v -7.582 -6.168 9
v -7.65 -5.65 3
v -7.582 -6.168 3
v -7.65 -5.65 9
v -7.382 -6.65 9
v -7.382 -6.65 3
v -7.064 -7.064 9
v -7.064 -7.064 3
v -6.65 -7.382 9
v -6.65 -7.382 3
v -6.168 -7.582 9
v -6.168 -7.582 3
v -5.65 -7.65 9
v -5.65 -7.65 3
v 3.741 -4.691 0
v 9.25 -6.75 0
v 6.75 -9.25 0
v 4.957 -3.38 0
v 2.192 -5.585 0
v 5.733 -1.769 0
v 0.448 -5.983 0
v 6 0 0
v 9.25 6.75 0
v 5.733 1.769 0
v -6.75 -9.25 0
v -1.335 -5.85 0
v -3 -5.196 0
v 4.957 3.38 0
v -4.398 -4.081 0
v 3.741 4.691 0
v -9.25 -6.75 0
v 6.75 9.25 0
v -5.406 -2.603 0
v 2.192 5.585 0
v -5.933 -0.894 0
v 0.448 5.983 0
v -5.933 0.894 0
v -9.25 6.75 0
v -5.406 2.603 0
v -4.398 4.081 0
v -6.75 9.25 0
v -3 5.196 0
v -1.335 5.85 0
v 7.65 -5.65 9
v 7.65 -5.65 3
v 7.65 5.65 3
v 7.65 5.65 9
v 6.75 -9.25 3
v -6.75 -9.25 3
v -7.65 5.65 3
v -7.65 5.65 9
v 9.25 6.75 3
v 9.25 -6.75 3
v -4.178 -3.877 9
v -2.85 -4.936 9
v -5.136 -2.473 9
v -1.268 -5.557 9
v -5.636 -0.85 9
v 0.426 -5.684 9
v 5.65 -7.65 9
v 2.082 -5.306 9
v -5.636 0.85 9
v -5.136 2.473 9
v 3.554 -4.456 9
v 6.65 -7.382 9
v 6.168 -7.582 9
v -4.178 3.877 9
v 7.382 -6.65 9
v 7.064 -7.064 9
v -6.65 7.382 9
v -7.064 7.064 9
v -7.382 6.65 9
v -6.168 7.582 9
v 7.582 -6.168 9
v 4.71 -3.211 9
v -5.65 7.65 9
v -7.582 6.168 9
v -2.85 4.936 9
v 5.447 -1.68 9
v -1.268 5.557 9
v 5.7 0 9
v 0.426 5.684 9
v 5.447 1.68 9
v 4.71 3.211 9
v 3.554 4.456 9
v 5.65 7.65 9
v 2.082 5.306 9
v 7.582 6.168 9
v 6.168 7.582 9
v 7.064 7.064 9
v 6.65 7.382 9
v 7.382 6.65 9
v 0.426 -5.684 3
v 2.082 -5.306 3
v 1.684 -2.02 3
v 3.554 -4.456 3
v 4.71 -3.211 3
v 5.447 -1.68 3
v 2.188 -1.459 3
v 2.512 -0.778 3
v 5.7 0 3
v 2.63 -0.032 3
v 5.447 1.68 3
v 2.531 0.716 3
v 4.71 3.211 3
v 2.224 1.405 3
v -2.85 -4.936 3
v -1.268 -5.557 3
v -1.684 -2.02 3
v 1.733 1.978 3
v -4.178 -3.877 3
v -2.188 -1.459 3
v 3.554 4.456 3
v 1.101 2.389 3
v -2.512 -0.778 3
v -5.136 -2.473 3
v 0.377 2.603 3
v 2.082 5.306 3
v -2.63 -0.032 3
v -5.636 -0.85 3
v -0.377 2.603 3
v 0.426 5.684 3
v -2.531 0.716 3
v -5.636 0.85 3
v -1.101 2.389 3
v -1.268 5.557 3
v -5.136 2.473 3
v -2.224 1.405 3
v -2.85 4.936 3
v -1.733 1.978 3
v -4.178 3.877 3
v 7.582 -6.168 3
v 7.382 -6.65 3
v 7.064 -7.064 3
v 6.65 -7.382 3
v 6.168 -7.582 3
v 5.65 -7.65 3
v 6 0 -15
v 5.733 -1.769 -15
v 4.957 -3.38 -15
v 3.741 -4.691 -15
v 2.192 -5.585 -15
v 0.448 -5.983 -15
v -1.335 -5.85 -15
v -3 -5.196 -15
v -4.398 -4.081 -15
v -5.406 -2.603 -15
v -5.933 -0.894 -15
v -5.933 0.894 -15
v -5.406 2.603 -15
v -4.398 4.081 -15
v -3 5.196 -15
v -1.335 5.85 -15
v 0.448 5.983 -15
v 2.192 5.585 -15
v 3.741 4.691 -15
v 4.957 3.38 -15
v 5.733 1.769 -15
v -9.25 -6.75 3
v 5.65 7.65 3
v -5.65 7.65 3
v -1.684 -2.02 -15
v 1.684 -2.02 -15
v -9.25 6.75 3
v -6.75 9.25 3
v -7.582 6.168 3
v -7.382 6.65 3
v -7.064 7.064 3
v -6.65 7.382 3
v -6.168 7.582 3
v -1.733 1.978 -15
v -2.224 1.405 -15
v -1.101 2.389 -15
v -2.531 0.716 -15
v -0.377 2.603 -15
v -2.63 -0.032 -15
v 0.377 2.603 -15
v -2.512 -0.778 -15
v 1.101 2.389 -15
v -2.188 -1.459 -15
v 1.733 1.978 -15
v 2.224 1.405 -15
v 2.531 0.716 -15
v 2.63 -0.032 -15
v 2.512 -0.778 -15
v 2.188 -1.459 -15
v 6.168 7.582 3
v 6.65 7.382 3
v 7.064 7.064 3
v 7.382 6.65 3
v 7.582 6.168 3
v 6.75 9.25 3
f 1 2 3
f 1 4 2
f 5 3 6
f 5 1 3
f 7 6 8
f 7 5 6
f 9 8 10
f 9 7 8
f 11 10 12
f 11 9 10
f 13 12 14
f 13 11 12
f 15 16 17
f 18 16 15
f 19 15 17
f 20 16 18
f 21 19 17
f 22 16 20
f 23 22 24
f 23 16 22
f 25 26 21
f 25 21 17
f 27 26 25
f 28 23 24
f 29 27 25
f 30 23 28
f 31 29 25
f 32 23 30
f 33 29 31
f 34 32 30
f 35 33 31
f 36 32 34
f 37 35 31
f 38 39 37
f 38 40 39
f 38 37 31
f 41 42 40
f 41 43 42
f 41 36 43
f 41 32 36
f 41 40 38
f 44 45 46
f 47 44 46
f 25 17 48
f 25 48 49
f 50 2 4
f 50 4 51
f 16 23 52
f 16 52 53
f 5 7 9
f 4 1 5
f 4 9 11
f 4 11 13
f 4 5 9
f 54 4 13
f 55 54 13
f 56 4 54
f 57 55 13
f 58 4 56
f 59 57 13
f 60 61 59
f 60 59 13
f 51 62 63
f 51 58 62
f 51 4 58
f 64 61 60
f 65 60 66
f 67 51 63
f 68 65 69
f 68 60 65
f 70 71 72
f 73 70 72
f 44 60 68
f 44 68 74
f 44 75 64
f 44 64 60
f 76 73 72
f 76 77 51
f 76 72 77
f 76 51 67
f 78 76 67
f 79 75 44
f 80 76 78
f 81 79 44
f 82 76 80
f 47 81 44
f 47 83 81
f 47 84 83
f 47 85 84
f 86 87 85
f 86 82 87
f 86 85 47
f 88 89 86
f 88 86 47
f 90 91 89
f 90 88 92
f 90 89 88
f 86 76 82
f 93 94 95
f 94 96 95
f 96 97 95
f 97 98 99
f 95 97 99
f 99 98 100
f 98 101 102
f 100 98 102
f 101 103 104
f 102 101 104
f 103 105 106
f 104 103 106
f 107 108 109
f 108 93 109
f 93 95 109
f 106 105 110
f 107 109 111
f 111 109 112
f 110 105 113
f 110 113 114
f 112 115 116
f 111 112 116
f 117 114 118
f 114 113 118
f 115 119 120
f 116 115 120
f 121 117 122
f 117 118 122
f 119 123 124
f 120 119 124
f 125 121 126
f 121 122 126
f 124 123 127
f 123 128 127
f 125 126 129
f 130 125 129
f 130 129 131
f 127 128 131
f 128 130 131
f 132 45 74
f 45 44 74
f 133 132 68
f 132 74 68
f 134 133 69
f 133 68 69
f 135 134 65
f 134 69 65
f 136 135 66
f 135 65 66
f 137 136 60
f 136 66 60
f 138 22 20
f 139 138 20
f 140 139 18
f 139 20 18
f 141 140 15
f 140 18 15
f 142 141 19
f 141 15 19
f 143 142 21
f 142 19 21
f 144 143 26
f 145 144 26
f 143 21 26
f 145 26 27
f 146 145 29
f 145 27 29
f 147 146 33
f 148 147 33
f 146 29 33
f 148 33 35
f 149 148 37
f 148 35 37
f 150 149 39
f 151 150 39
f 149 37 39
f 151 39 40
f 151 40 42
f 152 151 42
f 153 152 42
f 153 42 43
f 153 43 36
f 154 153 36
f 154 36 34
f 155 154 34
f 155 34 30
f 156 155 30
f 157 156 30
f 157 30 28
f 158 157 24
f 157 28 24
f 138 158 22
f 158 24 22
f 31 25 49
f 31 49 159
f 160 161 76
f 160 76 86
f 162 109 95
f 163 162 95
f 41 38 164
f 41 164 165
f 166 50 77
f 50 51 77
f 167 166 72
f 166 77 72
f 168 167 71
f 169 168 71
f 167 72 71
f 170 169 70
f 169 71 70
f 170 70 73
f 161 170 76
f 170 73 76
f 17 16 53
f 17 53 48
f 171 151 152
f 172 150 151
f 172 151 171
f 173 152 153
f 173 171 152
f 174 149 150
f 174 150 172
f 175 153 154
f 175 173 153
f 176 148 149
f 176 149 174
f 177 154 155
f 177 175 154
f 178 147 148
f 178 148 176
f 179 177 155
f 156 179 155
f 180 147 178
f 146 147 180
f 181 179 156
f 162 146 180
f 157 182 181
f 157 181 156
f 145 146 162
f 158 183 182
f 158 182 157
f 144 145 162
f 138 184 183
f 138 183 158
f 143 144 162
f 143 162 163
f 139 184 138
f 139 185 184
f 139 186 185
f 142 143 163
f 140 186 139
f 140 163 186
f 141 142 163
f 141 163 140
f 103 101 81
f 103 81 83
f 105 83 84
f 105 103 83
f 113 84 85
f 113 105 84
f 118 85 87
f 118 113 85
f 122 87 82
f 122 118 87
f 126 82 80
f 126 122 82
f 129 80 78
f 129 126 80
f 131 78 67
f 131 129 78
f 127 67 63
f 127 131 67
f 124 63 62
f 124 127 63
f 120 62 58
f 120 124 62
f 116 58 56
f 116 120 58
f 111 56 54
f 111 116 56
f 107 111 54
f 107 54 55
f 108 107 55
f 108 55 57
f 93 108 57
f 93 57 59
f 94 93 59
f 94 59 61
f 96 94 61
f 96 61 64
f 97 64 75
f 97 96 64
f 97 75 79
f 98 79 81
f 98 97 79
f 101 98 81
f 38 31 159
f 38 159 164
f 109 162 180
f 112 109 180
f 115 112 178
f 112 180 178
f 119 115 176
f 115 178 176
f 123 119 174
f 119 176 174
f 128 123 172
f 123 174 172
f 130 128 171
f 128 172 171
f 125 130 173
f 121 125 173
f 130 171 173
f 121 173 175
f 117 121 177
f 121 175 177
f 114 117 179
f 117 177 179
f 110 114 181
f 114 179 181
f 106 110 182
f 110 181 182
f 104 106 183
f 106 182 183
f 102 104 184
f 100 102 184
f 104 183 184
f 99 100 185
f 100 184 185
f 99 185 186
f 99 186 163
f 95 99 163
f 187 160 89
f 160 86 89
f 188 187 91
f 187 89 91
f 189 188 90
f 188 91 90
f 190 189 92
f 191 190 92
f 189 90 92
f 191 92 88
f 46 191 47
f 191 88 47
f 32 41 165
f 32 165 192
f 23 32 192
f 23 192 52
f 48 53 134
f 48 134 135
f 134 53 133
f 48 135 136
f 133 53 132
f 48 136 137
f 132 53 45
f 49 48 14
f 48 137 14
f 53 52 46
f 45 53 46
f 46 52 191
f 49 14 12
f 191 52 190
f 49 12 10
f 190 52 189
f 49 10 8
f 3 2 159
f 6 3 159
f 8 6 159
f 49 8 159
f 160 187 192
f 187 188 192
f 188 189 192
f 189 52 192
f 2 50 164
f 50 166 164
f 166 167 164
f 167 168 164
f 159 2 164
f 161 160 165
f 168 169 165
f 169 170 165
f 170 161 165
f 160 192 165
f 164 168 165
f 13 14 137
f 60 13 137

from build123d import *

# Parameters (mm, degrees)
PAD_DEPTH    = 3
SKETCH001_W  = 15.3
SKETCH001_H  = 15.3
SKETCH001_R  = 5.7
PAD001_DEPTH = 6
SKETCH002_R  = 6
PAD002_DEPTH = 15
POCKET_DEPTH = 24.001
FILLET_R     = 2


with BuildPart() as part:
    # Sketch → Pad (new body)
    with BuildSketch(Plane.XY):
        Polygon((-9.25, 6.75), (-6.75, 9.25), (6.75, 9.25), (9.25, 6.75), (9.25, -6.75), (6.75, -9.25), (-6.75, -9.25), (-9.25, -6.75), align=None)
    extrude(amount=PAD_DEPTH)

    # Sketch001 → Pad001 (new body)
    with BuildSketch(Plane.XY.offset(3)):
        Rectangle(SKETCH001_W, SKETCH001_H)
        Circle(SKETCH001_R, mode=Mode.SUBTRACT)
    extrude(amount=PAD001_DEPTH)

    # Sketch002 → Pad002 (new body)
    with BuildSketch(Plane(origin=(0, 0, 0), x_dir=(1, 0, 0), z_dir=(0, 0, -1))):
        Circle(SKETCH002_R)
    extrude(amount=PAD002_DEPTH)

    # Sketch003 → Pocket (cut, through all)
    with BuildSketch(Plane(origin=(0, 0, -15), x_dir=(1, 0, 0), z_dir=(0, 0, -1))):
        with BuildLine():
            Line((-1.684191, 2.02), (1.684191, 2.02))
            ThreePointArc((-1.684191, 2.02), (0, -2.63), (1.684191, 2.02))
        make_face()
    extrude(amount=-POCKET_DEPTH, mode=Mode.SUBTRACT)

    # Fillet
    fillet_edges = [part.edges().sort_by_distance(p)[0] for p in [
        (-7.65, -7.65, 6),
        (7.65, -7.65, 6),
        (-7.65, 7.65, 6),
        (7.65, 7.65, 6),
    ]]
    fillet(fillet_edges, radius=FILLET_R)


solid = part.part
